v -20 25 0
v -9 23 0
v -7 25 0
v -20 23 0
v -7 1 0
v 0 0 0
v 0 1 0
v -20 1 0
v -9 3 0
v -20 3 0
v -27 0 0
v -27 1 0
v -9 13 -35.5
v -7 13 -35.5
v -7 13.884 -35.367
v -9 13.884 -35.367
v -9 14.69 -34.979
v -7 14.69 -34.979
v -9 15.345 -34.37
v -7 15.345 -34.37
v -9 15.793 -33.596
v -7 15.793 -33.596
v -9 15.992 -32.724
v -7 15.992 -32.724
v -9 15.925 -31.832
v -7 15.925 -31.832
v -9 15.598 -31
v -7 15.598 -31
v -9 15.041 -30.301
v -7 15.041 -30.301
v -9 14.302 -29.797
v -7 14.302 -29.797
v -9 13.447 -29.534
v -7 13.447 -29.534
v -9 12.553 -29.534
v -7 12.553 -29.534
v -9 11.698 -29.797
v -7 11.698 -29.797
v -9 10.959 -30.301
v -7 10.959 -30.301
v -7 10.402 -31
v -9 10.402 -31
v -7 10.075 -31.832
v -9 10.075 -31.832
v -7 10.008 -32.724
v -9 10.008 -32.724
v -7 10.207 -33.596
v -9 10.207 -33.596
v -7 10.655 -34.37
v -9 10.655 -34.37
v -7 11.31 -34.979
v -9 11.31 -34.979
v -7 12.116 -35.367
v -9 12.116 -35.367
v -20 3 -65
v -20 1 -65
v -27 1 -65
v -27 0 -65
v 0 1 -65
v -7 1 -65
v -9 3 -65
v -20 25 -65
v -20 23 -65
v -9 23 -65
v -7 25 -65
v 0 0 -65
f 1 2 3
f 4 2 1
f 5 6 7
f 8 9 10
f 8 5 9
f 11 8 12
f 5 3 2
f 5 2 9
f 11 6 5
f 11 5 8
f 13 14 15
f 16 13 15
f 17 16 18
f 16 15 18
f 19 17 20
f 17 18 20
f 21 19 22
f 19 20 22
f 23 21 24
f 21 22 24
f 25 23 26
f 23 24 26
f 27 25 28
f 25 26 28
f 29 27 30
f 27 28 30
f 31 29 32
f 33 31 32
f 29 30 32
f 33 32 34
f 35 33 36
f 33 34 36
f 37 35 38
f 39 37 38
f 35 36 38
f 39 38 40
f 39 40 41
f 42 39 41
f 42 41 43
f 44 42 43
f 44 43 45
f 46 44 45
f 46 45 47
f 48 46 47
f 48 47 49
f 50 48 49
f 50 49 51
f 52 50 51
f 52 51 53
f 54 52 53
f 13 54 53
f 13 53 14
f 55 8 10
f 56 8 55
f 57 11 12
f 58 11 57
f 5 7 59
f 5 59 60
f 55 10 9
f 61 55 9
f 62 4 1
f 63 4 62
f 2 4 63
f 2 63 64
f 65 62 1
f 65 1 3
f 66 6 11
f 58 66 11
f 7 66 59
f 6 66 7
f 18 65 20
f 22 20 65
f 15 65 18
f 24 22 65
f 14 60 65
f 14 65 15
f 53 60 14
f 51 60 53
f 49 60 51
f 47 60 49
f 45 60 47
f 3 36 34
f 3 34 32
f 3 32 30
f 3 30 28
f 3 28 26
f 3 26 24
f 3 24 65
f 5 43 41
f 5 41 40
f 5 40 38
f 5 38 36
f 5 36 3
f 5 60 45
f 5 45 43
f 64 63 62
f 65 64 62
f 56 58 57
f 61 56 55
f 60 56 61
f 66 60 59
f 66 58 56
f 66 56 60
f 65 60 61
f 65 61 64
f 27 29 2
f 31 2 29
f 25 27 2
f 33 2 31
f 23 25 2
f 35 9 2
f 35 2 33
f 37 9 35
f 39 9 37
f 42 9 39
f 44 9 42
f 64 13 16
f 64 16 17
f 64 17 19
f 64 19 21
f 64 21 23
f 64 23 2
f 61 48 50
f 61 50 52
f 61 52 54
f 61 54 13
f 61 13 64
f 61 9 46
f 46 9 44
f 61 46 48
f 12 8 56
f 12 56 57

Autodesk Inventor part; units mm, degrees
ref_plane "YZ Plane" through (0, 0, 0) normal (1, 0, 0) x (0, 1, 0)
ref_plane "XZ Plane" through (0, 0, 0) normal (0, 1, 0) x (-1, 0, 0)
ref_plane "XY Plane" through (0, 0, 0) normal (0, 0, 1) x (1, 0, 0)
sketch "Sketch1" plane through (0, 0, 0) normal (0, 1, 0) x (-1, 0, 0)
  line L0 (0, 0) -> (27, 0)
  line L1 (27, 0) -> (27, -65)
  line L2 (27, -65) -> (0, -65)
  line L3 (0, -65) -> (0, 0)
  dimension "d0" = 27
  dimension "d1" = 65
extrude "Extrusion1" add sketch "Sketch1" along normal blind 1
sketch "Sketch2" plane through (0, 1, 0) normal (0, 1, 0) x (1, 0, 0)
  line L0 (-27, 0) -> (0, 0) projected
  line L1 (0, 65) -> (-27, 65) projected
  line L2 (-13.5, 0) -> (-20, 0)
  line L3 (-20, 0) -> (-7, 0)
  line L4 (-7, 0) -> (-7, 65)
  line L5 (-20, 0) -> (-20, 65)
  line L6 (-7, 65) -> (-20, 65)
  dimension "d4" = 6.5
  dimension "d5" = 13
extrude "Extrusion2" add sketch "Sketch2" along normal blind 2
sketch "Sketch3" plane through (0, 3, 0) normal (0, 1, 0) x (1, 0, 0)
  line L0 (-7, 0) -> (-7, 65) projected
  line L1 (-7, 65) -> (-20, 65) projected
  line L2 (-7, 0) -> (-9, 0)
  line L3 (-9, 0) -> (-9, 65)
  line L4 (-9, 65) -> (-7, 65)
  line L5 (-7, 65) -> (-7, 0)
  point P0 (0, 0)
  dimension "d8" = 2
extrude "Extrusion3" add sketch "Sketch3" along normal blind 20
sketch "Sketch4" plane through (0, 23, 0) normal (0, 1, 0) x (1, 0, 0)
  line L0 (-20, 0) -> (-20, 65) projected
  line L1 (-7, 0) -> (-20, 0)
  line L2 (-20, 0) -> (-20, 65)
  line L3 (-20, 65) -> (-7, 65)
  line L4 (-7, 65) -> (-7, 0)
  point P0 (0, 0)
extrude "Extrusion4" add sketch "Sketch4" along normal blind 2
sketch "Sketch5" plane through (-7, 1, 0) normal (1, 0, 0) x (0, 0, -1)
  line L0 (65, 0) -> (65, 24) projected
  line L1 (0, 0) -> (0, 24) projected
  line L2 (0, 12) -> (65, 12)
  circle A0 centre (32.5, 12) radius 3
  point P0 (0, -1)
  dimension "d13" = 6
extrude "Extrusion5" cut sketch "Sketch5" against normal blind 2
properties part number "EE Track"
